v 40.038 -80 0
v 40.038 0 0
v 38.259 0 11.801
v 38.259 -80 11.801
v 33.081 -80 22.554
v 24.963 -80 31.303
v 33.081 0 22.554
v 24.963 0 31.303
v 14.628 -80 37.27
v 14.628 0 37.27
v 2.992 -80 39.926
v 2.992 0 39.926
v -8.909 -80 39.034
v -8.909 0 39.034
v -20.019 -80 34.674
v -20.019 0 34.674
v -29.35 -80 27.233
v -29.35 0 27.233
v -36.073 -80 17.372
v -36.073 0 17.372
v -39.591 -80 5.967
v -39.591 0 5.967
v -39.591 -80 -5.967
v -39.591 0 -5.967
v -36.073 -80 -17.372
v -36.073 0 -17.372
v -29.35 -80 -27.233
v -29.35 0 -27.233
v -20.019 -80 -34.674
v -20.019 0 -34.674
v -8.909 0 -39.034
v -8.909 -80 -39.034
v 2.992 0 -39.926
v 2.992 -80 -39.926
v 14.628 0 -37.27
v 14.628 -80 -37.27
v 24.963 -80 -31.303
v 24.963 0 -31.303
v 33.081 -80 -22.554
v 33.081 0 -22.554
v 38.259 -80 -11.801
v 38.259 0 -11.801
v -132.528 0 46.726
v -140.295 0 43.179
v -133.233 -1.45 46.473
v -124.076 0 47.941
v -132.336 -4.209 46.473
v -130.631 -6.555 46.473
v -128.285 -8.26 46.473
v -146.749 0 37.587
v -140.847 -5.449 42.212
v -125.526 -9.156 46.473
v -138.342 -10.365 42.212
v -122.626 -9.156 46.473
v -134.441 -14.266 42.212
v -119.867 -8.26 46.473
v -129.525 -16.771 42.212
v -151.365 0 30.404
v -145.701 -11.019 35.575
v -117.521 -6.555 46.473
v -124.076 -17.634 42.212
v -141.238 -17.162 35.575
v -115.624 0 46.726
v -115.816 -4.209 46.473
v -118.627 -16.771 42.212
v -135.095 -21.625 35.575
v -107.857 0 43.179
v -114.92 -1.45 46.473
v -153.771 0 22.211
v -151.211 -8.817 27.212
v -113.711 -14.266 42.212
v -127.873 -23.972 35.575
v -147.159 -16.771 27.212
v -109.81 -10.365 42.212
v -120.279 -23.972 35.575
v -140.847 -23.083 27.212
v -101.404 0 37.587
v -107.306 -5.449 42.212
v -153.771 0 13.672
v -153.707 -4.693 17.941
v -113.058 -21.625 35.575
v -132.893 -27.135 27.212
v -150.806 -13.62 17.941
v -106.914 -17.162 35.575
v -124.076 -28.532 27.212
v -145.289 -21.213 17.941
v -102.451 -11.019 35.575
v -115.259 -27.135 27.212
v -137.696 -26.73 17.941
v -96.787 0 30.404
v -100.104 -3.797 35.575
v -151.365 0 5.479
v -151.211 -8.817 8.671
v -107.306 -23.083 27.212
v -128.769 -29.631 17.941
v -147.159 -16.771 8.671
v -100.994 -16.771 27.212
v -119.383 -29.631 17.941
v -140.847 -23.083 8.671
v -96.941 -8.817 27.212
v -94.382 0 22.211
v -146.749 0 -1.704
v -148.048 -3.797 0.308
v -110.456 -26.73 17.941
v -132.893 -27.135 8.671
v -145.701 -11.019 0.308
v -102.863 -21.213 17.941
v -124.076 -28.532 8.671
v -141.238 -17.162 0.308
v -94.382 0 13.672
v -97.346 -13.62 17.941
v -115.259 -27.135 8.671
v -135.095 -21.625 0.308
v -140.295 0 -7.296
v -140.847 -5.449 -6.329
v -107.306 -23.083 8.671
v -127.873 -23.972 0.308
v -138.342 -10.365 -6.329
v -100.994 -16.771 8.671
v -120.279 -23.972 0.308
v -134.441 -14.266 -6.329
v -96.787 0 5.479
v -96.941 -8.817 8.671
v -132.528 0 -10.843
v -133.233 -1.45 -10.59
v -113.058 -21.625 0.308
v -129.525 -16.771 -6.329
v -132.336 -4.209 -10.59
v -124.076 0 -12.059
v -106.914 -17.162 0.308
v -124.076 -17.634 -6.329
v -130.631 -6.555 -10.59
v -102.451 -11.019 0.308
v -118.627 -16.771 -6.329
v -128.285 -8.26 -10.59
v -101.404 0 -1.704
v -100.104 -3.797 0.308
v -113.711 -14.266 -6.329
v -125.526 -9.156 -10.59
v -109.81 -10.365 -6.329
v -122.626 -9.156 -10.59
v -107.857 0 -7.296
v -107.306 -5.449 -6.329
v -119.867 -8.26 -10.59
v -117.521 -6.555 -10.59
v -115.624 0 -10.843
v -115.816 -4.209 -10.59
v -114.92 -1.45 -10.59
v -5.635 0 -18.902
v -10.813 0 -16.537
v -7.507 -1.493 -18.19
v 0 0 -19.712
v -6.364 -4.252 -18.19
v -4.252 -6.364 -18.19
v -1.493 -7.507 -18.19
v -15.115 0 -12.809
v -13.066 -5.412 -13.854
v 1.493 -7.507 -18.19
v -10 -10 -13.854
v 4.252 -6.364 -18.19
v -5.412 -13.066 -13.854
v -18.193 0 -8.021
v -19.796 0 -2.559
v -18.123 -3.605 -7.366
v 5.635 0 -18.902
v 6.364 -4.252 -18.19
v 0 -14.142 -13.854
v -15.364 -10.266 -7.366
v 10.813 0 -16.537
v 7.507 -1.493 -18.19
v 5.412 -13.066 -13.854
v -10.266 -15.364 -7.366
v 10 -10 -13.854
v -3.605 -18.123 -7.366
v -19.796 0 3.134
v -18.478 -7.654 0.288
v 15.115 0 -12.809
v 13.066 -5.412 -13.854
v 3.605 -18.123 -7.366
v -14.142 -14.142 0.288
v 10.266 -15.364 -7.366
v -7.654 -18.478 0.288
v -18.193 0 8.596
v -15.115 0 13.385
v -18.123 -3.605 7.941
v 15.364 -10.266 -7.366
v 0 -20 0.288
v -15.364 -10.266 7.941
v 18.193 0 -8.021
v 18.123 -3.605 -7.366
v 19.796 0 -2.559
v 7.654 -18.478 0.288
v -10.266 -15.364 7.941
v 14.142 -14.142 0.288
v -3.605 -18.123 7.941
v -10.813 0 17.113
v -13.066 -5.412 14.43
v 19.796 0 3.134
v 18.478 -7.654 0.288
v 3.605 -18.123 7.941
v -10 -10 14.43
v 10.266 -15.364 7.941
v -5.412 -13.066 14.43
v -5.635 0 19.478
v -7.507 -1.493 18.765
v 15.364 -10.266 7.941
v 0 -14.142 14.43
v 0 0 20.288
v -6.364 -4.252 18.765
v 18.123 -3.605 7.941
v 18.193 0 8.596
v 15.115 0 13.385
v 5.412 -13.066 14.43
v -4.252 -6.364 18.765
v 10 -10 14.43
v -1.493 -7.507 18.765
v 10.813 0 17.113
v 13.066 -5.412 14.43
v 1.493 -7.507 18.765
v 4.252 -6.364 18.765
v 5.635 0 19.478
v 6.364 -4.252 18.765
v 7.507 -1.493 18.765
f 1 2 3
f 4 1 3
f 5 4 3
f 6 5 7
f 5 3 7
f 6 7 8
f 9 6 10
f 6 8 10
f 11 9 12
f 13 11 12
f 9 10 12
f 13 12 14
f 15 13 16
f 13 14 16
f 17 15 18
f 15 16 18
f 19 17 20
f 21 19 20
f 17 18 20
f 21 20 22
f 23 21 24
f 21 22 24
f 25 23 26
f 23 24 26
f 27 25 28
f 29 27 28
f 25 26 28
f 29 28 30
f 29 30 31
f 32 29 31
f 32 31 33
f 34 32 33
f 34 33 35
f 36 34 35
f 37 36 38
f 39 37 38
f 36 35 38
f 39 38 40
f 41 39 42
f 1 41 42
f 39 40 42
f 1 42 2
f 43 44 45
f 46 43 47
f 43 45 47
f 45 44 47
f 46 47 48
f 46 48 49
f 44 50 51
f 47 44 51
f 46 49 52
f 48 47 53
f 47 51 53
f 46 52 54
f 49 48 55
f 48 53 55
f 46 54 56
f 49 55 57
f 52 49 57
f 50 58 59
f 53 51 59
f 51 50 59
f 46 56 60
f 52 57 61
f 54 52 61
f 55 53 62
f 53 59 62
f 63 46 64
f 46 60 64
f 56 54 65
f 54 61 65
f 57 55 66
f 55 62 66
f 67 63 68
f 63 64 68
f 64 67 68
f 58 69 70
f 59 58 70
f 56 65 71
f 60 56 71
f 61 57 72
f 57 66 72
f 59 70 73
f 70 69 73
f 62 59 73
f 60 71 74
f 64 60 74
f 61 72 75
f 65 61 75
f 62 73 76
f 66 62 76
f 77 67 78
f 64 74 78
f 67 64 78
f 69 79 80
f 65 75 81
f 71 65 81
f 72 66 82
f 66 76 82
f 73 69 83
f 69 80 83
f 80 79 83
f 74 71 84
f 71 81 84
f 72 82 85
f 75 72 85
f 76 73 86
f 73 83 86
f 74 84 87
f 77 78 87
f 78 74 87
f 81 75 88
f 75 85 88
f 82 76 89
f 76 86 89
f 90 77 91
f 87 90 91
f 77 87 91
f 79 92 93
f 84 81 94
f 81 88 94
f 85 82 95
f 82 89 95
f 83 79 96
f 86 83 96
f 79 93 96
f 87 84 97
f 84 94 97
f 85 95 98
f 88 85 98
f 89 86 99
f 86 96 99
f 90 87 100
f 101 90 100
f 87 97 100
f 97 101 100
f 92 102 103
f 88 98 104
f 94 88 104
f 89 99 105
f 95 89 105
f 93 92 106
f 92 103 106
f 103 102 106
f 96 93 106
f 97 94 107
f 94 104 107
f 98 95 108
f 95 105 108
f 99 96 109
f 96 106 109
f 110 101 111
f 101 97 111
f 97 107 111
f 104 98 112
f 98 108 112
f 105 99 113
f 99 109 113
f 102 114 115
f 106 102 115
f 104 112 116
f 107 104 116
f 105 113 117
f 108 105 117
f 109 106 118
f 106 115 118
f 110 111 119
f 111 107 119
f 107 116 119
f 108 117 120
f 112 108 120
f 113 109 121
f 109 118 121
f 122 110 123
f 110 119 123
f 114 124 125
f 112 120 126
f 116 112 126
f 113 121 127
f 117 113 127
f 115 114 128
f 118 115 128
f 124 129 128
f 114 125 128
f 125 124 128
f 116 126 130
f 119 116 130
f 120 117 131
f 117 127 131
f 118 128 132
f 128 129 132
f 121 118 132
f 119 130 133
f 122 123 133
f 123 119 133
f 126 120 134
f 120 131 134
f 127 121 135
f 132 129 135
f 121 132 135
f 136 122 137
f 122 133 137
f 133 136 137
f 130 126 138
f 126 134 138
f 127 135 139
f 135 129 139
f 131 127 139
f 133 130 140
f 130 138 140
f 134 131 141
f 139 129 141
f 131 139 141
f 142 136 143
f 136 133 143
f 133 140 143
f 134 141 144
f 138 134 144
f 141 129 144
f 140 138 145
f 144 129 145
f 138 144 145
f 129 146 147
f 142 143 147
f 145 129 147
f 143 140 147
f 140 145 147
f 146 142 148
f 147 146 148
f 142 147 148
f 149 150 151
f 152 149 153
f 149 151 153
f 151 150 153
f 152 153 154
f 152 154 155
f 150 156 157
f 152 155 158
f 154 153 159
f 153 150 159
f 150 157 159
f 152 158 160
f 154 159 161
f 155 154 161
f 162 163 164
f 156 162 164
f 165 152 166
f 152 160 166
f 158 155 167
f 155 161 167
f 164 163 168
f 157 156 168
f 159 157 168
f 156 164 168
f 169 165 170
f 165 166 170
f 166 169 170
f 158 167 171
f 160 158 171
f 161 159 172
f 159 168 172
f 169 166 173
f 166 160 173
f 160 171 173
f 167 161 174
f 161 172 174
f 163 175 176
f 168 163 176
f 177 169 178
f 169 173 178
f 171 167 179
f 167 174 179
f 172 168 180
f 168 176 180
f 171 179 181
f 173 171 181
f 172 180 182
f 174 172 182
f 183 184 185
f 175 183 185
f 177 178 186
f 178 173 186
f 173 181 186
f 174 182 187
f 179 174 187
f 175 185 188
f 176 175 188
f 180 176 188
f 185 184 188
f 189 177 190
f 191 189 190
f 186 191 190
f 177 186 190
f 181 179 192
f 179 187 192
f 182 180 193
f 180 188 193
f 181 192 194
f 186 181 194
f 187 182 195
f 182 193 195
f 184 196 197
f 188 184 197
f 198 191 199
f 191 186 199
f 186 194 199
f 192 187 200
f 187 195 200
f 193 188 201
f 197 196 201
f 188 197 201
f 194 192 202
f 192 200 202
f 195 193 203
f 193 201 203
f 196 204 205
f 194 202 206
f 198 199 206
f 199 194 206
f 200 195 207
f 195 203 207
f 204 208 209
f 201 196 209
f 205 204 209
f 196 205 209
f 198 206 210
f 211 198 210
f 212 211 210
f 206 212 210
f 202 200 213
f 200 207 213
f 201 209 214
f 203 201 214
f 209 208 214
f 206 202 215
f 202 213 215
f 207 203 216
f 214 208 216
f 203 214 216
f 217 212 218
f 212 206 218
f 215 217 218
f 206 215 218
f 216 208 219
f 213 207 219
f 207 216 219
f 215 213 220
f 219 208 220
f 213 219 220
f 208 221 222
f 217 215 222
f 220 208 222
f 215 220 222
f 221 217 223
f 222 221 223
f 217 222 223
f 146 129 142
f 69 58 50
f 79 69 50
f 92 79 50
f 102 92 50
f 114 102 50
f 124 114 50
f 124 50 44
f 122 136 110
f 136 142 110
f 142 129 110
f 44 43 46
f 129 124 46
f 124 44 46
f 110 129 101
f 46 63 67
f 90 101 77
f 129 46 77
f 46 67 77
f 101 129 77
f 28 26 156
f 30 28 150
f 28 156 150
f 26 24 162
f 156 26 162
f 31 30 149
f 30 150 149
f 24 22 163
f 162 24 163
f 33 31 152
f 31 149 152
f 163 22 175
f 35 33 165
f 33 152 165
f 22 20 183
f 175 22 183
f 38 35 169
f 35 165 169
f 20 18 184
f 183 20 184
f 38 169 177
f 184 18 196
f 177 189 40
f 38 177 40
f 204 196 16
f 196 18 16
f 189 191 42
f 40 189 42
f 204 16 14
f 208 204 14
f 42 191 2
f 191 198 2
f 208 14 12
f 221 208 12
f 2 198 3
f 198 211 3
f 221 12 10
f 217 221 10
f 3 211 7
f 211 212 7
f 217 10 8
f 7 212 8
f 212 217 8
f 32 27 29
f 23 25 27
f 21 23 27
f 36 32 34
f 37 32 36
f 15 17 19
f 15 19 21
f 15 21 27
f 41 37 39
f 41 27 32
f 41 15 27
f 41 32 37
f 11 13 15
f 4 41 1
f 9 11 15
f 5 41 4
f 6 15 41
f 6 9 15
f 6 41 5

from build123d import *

# Parameters (mm, degrees)
F0_R     = 40.0379704722
F1_DEPTH = 80
F7_ANGLE = 180


# Not quite as in the source:
# - the program builds the solid bodies; features that only make, move or delete a surface that nothing else refers to are left out


with BuildPart() as f1:
    # F0 (on Front) → F1 (new body)
    with BuildSketch(Plane.XZ):
        Circle(F0_R)
    extrude(amount=F1_DEPTH)

    # F2 (on Front) → F3 (revolve, cut)
    with BuildSketch(Plane.XZ):
        with BuildLine():
            Line((0, 20.2877700597), (0, -19.7122299403))
            ThreePointArc((0, -19.7122299403), (20, 0.2877700597), (0, 20.2877700597))
        make_face()
    revolve(axis=Axis((0, 0, 0.2877700597), (0, 0, 1)), mode=Mode.SUBTRACT)


with BuildPart() as f7:
    # F6 (on Front) → F7 (revolve)
    with BuildSketch(Plane.XZ):
        with BuildLine():
            ThreePointArc((-124.0761767042, 47.9414828308), (-154.0761767042, 17.9414828308), (-124.0761767042, -12.0585171692))
            Line((-124.0761767042, -12.0585171692), (-124.0761767042, 47.9414828308))
        make_face()
    revolve(axis=Axis((-124.0761767042, 0, 17.9414828308), (0, 0, 1)), revolution_arc=F7_ANGLE)


solid = Compound([f1.part, f7.part])
